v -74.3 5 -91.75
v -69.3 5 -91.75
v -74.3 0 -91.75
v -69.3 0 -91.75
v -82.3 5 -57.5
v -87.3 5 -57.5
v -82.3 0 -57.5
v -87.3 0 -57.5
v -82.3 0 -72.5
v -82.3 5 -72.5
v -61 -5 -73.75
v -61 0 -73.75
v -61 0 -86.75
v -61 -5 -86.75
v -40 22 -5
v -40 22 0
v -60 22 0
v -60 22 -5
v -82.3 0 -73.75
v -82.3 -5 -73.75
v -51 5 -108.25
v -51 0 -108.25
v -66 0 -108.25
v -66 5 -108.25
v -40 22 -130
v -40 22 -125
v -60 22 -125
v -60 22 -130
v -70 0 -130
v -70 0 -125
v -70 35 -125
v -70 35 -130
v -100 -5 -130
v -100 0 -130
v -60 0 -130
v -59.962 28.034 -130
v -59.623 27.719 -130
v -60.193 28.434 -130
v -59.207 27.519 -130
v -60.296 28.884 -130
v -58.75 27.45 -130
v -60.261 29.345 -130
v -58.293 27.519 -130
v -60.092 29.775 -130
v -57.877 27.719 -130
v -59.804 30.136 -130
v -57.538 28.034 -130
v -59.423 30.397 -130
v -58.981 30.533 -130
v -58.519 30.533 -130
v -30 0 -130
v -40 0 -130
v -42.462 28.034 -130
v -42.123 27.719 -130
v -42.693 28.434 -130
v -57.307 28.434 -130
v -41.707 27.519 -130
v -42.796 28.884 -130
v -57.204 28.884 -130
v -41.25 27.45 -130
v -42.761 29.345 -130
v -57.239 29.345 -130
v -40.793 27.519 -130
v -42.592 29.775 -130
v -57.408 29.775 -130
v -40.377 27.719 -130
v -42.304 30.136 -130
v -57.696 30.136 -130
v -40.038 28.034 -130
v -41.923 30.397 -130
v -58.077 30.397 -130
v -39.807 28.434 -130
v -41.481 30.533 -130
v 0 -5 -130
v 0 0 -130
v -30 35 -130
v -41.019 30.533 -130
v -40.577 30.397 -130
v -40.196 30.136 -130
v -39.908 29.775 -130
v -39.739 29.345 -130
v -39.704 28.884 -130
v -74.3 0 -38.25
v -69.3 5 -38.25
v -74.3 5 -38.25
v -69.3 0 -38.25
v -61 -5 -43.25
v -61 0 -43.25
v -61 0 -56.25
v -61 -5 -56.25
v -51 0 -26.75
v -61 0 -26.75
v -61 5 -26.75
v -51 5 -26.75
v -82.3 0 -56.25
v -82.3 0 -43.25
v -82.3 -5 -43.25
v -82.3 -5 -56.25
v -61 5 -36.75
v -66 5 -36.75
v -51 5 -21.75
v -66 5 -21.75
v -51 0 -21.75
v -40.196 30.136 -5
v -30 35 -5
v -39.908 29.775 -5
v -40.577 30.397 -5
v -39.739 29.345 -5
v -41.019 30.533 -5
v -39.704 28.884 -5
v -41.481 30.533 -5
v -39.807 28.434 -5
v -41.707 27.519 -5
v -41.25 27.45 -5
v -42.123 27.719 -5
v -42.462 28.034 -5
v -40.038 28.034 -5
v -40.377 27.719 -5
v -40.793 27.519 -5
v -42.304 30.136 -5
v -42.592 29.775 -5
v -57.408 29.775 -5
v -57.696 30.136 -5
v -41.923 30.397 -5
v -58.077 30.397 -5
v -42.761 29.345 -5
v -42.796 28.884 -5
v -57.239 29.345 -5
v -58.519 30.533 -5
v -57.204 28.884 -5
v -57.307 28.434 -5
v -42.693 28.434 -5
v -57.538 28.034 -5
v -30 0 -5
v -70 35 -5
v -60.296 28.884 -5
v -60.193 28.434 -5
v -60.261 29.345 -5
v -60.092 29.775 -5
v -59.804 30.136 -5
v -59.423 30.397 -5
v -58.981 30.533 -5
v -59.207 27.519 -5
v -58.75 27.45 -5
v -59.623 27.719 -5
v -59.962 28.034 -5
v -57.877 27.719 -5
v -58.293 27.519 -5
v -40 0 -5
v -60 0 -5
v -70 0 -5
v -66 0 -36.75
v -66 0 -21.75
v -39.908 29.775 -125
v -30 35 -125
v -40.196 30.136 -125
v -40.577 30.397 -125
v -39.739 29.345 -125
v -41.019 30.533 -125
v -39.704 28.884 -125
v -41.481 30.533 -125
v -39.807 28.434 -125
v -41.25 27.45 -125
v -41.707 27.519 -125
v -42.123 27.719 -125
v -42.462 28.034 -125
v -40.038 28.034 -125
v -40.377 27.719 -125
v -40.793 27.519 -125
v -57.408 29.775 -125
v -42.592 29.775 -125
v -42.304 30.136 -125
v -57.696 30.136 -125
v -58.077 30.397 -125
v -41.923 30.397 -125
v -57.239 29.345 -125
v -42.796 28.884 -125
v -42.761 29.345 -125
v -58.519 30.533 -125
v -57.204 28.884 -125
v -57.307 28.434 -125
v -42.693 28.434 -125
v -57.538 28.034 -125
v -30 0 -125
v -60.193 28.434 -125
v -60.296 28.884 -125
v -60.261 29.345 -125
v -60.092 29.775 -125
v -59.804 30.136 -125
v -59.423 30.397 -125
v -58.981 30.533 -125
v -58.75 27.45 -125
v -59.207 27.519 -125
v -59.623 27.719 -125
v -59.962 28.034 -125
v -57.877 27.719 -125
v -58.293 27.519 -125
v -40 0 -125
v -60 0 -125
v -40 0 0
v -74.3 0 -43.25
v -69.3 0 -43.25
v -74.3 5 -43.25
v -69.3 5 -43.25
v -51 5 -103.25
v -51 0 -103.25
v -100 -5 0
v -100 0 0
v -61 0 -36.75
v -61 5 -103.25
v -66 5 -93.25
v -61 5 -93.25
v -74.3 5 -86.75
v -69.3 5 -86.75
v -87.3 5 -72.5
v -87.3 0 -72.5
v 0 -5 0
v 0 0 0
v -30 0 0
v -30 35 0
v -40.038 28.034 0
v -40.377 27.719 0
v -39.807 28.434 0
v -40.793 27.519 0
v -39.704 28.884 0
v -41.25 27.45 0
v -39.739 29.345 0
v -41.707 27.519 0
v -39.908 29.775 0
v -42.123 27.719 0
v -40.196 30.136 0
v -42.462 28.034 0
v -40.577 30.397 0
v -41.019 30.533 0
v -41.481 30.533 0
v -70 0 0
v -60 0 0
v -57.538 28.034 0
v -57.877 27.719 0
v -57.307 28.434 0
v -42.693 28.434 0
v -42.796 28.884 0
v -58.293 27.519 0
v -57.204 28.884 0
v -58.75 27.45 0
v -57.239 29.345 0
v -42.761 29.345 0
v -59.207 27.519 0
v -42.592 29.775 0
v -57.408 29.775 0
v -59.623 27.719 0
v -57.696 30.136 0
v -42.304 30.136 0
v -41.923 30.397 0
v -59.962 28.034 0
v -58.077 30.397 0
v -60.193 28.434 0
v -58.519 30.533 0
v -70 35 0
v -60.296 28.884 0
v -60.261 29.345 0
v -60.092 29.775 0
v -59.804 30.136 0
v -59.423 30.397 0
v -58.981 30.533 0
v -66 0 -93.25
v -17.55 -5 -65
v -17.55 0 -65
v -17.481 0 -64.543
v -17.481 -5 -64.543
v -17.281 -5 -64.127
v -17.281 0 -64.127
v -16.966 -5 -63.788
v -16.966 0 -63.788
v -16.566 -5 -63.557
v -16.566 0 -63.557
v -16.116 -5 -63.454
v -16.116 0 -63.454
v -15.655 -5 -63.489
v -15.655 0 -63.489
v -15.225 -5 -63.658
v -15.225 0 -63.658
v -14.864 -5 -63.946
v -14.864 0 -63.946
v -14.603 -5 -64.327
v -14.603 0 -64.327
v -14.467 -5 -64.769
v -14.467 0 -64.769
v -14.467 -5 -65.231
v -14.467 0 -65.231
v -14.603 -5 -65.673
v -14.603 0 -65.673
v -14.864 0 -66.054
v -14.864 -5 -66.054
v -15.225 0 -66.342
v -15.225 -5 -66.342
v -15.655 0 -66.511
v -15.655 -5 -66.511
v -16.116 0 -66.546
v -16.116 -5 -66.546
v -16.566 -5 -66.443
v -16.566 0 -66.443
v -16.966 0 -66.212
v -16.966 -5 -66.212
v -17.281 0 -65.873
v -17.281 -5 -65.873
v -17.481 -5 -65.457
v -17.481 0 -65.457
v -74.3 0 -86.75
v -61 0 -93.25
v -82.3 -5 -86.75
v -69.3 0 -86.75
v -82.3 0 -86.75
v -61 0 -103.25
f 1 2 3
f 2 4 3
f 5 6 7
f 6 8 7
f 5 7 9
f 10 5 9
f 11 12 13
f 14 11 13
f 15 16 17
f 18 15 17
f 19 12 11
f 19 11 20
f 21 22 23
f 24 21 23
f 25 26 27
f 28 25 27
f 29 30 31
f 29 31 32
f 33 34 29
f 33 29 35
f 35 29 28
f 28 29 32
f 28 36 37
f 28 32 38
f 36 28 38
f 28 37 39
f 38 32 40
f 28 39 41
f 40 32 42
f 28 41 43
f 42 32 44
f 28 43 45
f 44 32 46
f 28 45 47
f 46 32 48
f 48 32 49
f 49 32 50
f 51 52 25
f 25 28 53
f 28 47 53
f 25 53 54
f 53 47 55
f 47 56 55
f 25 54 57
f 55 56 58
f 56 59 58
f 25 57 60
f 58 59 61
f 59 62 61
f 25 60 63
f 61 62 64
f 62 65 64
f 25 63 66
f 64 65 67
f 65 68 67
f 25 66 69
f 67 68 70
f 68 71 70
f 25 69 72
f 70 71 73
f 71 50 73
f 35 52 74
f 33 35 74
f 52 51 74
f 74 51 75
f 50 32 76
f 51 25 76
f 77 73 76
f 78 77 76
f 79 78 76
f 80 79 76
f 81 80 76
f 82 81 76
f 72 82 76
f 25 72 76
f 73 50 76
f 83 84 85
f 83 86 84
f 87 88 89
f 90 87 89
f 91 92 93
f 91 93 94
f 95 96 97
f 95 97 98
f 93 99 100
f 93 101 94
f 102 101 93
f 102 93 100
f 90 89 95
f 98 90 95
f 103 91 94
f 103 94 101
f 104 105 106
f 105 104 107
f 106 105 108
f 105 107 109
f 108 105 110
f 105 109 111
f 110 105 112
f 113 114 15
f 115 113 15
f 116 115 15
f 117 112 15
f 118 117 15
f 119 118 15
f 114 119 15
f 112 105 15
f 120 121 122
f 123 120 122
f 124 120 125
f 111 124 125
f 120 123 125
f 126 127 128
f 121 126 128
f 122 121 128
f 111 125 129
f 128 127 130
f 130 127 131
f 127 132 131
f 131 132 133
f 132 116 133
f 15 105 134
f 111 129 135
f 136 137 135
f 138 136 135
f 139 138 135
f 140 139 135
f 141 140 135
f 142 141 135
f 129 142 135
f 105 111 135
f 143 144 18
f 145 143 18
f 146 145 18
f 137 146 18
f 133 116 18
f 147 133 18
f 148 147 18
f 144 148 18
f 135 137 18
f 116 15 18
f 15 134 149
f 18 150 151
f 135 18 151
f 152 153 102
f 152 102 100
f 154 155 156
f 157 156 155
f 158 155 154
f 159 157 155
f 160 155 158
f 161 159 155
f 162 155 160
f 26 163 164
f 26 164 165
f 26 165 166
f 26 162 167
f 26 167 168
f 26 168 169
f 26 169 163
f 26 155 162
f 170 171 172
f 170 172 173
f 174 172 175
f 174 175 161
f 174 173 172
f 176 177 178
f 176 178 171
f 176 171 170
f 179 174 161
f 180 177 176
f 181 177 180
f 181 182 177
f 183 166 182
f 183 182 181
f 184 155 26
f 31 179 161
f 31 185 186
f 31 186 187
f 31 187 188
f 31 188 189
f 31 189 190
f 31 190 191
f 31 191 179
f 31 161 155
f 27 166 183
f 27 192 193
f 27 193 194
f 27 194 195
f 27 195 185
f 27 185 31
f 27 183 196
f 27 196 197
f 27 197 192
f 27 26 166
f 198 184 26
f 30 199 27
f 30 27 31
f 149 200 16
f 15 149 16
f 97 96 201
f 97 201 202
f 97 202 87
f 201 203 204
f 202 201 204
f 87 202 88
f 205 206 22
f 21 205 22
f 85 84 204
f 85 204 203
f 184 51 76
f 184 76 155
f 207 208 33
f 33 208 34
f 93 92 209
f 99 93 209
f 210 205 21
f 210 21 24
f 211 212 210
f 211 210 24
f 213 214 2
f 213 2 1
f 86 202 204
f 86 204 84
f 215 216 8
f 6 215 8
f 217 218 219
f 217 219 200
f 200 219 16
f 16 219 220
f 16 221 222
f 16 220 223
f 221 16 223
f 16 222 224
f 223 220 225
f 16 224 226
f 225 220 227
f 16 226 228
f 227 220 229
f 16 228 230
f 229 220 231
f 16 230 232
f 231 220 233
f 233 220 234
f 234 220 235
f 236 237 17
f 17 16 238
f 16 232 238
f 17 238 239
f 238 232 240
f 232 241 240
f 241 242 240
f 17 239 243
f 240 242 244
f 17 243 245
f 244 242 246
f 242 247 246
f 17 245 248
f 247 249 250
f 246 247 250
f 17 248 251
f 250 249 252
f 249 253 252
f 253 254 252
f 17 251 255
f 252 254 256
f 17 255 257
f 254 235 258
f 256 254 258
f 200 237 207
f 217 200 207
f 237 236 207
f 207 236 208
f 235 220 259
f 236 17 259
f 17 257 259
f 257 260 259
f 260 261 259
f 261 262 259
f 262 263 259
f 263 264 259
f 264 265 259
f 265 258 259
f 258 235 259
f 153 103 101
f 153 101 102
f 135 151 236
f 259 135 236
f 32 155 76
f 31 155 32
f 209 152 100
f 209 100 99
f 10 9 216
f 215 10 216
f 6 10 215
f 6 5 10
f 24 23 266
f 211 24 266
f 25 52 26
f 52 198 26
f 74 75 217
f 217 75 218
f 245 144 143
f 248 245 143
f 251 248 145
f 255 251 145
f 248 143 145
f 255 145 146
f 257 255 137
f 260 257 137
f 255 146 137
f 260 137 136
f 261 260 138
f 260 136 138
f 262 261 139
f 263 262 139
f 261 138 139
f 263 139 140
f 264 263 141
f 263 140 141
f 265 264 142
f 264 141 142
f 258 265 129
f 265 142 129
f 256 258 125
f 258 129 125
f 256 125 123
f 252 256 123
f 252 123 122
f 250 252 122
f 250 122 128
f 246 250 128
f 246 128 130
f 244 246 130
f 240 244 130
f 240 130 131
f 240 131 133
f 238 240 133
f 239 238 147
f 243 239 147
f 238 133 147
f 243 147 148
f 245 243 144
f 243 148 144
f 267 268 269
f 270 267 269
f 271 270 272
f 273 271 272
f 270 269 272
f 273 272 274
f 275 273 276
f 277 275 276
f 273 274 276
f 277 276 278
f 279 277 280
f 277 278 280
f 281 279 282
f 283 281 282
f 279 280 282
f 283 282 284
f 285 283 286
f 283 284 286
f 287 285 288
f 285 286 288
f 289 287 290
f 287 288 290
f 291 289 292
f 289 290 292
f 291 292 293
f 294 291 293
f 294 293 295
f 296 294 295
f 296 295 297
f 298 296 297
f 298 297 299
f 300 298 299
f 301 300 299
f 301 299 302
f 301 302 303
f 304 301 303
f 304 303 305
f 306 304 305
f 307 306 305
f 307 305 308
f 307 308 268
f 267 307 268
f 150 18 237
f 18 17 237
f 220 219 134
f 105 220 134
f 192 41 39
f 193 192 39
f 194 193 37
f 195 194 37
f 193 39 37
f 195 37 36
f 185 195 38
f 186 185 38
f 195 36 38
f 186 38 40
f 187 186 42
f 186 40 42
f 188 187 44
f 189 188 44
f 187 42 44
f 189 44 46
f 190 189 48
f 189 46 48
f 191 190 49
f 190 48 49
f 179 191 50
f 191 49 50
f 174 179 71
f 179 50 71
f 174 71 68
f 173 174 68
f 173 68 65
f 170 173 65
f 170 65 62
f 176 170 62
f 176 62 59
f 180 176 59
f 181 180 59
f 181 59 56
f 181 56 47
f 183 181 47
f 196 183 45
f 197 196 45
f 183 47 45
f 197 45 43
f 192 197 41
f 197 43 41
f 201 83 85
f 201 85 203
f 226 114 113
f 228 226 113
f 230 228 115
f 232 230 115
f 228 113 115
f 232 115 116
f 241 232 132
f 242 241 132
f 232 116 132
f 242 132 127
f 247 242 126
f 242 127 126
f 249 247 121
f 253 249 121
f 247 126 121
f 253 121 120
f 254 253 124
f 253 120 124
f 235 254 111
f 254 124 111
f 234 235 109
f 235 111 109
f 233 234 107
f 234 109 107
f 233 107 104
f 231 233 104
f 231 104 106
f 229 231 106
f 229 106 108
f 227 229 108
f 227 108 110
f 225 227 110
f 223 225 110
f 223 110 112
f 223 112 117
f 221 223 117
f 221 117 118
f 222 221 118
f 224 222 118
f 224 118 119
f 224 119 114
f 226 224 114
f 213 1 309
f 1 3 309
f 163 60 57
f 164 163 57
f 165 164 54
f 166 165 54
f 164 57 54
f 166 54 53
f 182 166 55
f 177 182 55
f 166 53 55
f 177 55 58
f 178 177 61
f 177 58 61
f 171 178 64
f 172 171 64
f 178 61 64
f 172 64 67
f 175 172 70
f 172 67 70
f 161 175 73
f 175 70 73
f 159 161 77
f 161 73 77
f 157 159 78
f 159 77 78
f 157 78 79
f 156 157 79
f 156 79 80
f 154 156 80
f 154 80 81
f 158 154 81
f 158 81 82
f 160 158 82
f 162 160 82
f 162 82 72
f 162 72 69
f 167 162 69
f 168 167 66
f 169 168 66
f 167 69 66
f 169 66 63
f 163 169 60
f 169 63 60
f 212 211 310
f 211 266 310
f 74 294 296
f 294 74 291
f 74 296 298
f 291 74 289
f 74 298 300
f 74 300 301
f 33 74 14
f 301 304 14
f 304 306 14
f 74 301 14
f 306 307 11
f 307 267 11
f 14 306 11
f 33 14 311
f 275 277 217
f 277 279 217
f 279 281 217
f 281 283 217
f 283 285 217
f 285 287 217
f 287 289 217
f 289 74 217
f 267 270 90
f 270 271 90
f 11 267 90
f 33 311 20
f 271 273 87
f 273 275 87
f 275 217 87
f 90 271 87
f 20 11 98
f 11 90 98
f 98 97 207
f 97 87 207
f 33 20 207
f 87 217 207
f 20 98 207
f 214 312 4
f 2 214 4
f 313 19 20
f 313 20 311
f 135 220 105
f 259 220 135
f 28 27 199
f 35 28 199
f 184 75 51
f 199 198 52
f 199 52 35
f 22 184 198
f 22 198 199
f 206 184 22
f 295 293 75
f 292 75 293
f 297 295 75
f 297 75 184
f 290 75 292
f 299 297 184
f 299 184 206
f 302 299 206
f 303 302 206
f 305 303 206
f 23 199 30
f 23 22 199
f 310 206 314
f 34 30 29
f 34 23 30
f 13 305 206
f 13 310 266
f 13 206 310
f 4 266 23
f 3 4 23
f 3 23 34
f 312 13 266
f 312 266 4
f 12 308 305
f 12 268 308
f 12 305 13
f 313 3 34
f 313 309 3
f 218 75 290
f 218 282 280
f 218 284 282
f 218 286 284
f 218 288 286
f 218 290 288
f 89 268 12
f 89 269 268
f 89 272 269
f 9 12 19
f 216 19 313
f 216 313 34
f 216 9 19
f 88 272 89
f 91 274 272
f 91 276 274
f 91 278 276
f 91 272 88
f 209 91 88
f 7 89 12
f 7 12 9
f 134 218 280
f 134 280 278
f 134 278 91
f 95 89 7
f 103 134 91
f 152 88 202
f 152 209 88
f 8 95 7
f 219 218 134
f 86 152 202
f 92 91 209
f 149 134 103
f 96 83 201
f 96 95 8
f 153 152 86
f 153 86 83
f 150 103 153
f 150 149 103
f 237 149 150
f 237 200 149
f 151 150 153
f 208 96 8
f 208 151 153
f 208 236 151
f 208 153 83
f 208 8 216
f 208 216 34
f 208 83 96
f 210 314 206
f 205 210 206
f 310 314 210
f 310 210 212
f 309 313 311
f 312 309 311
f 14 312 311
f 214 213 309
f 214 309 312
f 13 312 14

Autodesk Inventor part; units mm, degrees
ref_plane "YZ Plane" through (0, 0, 0) normal (1, 0, 0) x (0, 1, 0)
ref_plane "XZ Plane" through (0, 0, 0) normal (0, 1, 0) x (-1, 0, 0)
ref_plane "XY Plane" through (0, 0, 0) normal (0, 0, 1) x (1, 0, 0)
sketch "Sketch1" plane through (0, 0, 0) normal (0, 1, 0) x (-1, 0, 0)
  line L0 (0, 0) -> (100, 0)
  line L1 (100, 0) -> (100, -130)
  line L2 (100, -130) -> (0, -130)
  line L3 (0, -130) -> (0, 0)
  line L4 (61, -26.75) -> (19.5, -26.75) construction
  line L5 (19.5, -26.75) -> (19.5, -103.25) construction
  line L6 (19.5, -103.25) -> (61, -103.25) construction
  line L7 (61, -103.25) -> (61, -26.75) construction
  line L8 (61, -65) -> (19.5, -65) construction
  line L9 (70, 0) -> (30, 0)
  line L10 (30, 0) -> (30, -5)
  line L11 (30, -5) -> (70, -5)
  line L12 (70, -5) -> (70, 0)
  line L13 (70, -130) -> (30, -130)
  line L14 (30, -130) -> (30, -125)
  line L15 (30, -125) -> (70, -125)
  line L16 (70, -125) -> (70, -130)
  line L17 (61, -26.75) -> (51, -26.75)
  line L18 (51, -21.75) -> (66, -21.75)
  line L19 (66, -21.75) -> (66, -36.75)
  line L20 (66, -36.75) -> (61, -36.75)
  line L21 (61, -26.75) -> (61, -36.75)
  line L22 (51, -103.25) -> (51, -108.25)
  line L23 (51, -108.25) -> (66, -108.25)
  line L24 (66, -108.25) -> (66, -93.25)
  line L25 (66, -93.25) -> (61, -93.25)
  line L26 (61, -103.25) -> (61, -93.25)
  line L27 (61, -103.25) -> (51, -103.25)
  line L28 (82.3, -43.25) -> (61, -43.25) construction
  line L29 (61, -43.25) -> (61, -86.75) construction
  line L30 (61, -86.75) -> (82.3, -86.75) construction
  line L31 (82.3, -86.75) -> (82.3, -43.25) construction
  line L32 (82.3, -43.25) -> (82.3, -48.25)
  line L33 (87.05, -43.25) -> (82.3, -43.25)
  line L34 (82.3, -43.25) -> (61, -43.25)
  line L35 (61, -43.25) -> (61, -56.25)
  line L36 (61, -56.25) -> (82.3, -56.25)
  line L37 (82.3, -56.25) -> (82.3, -43.25)
  line L38 (82.3, -65) -> (61, -65) construction
  line L39 (82.3, -86.75) -> (61, -86.75)
  line L40 (61, -73.75) -> (82.3, -73.75)
  line L41 (82.3, -81.75) -> (82.3, -86.75)
  line L42 (61, -73.75) -> (61, -86.75)
  line L43 (51, -26.75) -> (51, -21.75)
  circle A0 centre (16, -65) radius 1.55
  line L44 (82.3, -73.75) -> (82.3, -81.75)
  line L45 (82.3, -72.5) -> (87.3, -72.5)
  line L46 (87.3, -72.5) -> (87.3, -57.5)
  line L47 (87.3, -57.5) -> (82.3, -57.5)
  line L48 (82.3, -57.5) -> (82.3, -72.5)
  line L49 (74.3, -86.75) -> (69.3, -86.75)
  line L50 (69.3, -86.75) -> (69.3, -91.75)
  line L51 (69.3, -91.75) -> (74.3, -91.75)
  line L52 (74.3, -91.75) -> (74.3, -86.75)
  line L53 (74.3, -43.25) -> (69.3, -43.25)
  line L54 (69.3, -43.25) -> (69.3, -38.25)
  line L55 (69.3, -38.25) -> (74.3, -38.25)
  line L56 (74.3, -38.25) -> (74.3, -43.25)
  point P0 (100, -65)
  point P1 (50, 0)
  point P2 (50, -5)
  point P3 (50, 0)
  point P4 (60, -115)
  point P5 (70, -115)
  point P6 (66, -29.25)
  point P7 (92.05, -81.75)
  point P8 (92.05, -48.25)
  point P9 (51, -105.75)
  point P10 (63.5, -93.25)
  point P11 (87.3, -65)
  point P12 (82.3, -84.25)
  point P13 (74.3, -89.25)
  point P14 (87.05, -43.25)
  point P15 (50, -130)
  point P16 (70, -2.5)
  point P17 (70, -127.5)
  dimension "d0" = 100
  dimension "d1" = 130
  dimension "d2" = 76.5
  dimension "d3" = 41.5
  dimension "d19" = 40
  dimension "d20" = 5
  dimension "d43" = 43.5
  dimension "d44" = 21.3
  dimension "d50" = 0
  dimension "d55" = 13
  dimension "d58" = 10
  dimension "d59" = 5
  dimension "d60" = 5
  dimension "d62" = 10
  dimension "d63" = 5
  dimension "d64" = 15
  dimension "d65" = 15
  dimension "d66" = 5
  dimension "d67" = 10
  dimension "d68" = 10
  dimension "d83" = 3.1
  dimension "d84" = 3.5
  dimension "d85" = 6.5
  dimension "d86" = 15
  dimension "d87" = 5
  dimension "d88" = 5
  dimension "d89" = 5
  dimension "d90" = 8
  dimension "d93" = 40
  dimension "d94" = 5
  dimension "d95" = 34
extrude "Extrusion2" add sketch "Sketch1" against normal blind 5 contours L0 L10 L11 L12 L1 L2 L16 L15 L14 L3 | L0 L12 L11 L10 | L14 L15 L16 L2 | L17 L43 L18 L19 L20 L21 | L27 L26 L25 L24 L23 L22 | L32 L37 L36 L35 L34 | L34 L54 L55 L56 | L39 L42 L40 L44 L41 | L52 L51 L50 L39 | A0 | L48 L47 L46 L45
extrude "Extrusion3" add sketch "Sketch1" along normal blind 35 contours L0 L12 L11 L10 | L14 L15 L16 L2
sketch "Sketch2" plane through (-100, -5, 0) normal (0, 0, 1) x (1, 0, 0)
  line L0 (30, 5) -> (70, 5) projected
  line L1 (40, 5) -> (60, 5)
  line L2 (60, 5) -> (60, 27)
  line L3 (60, 27) -> (40, 27)
  line L4 (40, 27) -> (40, 5)
  line L5 (41.25, 34) -> (58.75, 34) construction
  line L6 (30, 40) -> (70, 40) projected
  point P0 (100, 5)
  point P1 (50, 5)
  point P2 (50, 27)
  point P3 (50, 34)
  dimension "d31" = 20
  dimension "d34" = 7
  dimension "d42" = 17.5
  dimension "d92" = 13
extrude "Extrusion6" cut sketch "Sketch2" against normal through all
hole "Hole2" at (-58.75, 29, 0) at (-41.25, 29, 0) direction (0, 0, -1) diameter 3.1 end through all
extrude "Extrusion7" cut sketch "Sketch1" against normal through all contours L32 L37 L36 L35 L34 | L39 L42 L40 L44 L41 | A0
extrude "Extrusion9" add sketch "Sketch1" along normal blind 5 contours L17 L43 L18 L19 L20 L21 | L27 L26 L25 L24 L23 L22 | L34 L54 L55 L56 | L52 L51 L50 L39 | L48 L47 L46 L45
properties part number "Chasis 1"
